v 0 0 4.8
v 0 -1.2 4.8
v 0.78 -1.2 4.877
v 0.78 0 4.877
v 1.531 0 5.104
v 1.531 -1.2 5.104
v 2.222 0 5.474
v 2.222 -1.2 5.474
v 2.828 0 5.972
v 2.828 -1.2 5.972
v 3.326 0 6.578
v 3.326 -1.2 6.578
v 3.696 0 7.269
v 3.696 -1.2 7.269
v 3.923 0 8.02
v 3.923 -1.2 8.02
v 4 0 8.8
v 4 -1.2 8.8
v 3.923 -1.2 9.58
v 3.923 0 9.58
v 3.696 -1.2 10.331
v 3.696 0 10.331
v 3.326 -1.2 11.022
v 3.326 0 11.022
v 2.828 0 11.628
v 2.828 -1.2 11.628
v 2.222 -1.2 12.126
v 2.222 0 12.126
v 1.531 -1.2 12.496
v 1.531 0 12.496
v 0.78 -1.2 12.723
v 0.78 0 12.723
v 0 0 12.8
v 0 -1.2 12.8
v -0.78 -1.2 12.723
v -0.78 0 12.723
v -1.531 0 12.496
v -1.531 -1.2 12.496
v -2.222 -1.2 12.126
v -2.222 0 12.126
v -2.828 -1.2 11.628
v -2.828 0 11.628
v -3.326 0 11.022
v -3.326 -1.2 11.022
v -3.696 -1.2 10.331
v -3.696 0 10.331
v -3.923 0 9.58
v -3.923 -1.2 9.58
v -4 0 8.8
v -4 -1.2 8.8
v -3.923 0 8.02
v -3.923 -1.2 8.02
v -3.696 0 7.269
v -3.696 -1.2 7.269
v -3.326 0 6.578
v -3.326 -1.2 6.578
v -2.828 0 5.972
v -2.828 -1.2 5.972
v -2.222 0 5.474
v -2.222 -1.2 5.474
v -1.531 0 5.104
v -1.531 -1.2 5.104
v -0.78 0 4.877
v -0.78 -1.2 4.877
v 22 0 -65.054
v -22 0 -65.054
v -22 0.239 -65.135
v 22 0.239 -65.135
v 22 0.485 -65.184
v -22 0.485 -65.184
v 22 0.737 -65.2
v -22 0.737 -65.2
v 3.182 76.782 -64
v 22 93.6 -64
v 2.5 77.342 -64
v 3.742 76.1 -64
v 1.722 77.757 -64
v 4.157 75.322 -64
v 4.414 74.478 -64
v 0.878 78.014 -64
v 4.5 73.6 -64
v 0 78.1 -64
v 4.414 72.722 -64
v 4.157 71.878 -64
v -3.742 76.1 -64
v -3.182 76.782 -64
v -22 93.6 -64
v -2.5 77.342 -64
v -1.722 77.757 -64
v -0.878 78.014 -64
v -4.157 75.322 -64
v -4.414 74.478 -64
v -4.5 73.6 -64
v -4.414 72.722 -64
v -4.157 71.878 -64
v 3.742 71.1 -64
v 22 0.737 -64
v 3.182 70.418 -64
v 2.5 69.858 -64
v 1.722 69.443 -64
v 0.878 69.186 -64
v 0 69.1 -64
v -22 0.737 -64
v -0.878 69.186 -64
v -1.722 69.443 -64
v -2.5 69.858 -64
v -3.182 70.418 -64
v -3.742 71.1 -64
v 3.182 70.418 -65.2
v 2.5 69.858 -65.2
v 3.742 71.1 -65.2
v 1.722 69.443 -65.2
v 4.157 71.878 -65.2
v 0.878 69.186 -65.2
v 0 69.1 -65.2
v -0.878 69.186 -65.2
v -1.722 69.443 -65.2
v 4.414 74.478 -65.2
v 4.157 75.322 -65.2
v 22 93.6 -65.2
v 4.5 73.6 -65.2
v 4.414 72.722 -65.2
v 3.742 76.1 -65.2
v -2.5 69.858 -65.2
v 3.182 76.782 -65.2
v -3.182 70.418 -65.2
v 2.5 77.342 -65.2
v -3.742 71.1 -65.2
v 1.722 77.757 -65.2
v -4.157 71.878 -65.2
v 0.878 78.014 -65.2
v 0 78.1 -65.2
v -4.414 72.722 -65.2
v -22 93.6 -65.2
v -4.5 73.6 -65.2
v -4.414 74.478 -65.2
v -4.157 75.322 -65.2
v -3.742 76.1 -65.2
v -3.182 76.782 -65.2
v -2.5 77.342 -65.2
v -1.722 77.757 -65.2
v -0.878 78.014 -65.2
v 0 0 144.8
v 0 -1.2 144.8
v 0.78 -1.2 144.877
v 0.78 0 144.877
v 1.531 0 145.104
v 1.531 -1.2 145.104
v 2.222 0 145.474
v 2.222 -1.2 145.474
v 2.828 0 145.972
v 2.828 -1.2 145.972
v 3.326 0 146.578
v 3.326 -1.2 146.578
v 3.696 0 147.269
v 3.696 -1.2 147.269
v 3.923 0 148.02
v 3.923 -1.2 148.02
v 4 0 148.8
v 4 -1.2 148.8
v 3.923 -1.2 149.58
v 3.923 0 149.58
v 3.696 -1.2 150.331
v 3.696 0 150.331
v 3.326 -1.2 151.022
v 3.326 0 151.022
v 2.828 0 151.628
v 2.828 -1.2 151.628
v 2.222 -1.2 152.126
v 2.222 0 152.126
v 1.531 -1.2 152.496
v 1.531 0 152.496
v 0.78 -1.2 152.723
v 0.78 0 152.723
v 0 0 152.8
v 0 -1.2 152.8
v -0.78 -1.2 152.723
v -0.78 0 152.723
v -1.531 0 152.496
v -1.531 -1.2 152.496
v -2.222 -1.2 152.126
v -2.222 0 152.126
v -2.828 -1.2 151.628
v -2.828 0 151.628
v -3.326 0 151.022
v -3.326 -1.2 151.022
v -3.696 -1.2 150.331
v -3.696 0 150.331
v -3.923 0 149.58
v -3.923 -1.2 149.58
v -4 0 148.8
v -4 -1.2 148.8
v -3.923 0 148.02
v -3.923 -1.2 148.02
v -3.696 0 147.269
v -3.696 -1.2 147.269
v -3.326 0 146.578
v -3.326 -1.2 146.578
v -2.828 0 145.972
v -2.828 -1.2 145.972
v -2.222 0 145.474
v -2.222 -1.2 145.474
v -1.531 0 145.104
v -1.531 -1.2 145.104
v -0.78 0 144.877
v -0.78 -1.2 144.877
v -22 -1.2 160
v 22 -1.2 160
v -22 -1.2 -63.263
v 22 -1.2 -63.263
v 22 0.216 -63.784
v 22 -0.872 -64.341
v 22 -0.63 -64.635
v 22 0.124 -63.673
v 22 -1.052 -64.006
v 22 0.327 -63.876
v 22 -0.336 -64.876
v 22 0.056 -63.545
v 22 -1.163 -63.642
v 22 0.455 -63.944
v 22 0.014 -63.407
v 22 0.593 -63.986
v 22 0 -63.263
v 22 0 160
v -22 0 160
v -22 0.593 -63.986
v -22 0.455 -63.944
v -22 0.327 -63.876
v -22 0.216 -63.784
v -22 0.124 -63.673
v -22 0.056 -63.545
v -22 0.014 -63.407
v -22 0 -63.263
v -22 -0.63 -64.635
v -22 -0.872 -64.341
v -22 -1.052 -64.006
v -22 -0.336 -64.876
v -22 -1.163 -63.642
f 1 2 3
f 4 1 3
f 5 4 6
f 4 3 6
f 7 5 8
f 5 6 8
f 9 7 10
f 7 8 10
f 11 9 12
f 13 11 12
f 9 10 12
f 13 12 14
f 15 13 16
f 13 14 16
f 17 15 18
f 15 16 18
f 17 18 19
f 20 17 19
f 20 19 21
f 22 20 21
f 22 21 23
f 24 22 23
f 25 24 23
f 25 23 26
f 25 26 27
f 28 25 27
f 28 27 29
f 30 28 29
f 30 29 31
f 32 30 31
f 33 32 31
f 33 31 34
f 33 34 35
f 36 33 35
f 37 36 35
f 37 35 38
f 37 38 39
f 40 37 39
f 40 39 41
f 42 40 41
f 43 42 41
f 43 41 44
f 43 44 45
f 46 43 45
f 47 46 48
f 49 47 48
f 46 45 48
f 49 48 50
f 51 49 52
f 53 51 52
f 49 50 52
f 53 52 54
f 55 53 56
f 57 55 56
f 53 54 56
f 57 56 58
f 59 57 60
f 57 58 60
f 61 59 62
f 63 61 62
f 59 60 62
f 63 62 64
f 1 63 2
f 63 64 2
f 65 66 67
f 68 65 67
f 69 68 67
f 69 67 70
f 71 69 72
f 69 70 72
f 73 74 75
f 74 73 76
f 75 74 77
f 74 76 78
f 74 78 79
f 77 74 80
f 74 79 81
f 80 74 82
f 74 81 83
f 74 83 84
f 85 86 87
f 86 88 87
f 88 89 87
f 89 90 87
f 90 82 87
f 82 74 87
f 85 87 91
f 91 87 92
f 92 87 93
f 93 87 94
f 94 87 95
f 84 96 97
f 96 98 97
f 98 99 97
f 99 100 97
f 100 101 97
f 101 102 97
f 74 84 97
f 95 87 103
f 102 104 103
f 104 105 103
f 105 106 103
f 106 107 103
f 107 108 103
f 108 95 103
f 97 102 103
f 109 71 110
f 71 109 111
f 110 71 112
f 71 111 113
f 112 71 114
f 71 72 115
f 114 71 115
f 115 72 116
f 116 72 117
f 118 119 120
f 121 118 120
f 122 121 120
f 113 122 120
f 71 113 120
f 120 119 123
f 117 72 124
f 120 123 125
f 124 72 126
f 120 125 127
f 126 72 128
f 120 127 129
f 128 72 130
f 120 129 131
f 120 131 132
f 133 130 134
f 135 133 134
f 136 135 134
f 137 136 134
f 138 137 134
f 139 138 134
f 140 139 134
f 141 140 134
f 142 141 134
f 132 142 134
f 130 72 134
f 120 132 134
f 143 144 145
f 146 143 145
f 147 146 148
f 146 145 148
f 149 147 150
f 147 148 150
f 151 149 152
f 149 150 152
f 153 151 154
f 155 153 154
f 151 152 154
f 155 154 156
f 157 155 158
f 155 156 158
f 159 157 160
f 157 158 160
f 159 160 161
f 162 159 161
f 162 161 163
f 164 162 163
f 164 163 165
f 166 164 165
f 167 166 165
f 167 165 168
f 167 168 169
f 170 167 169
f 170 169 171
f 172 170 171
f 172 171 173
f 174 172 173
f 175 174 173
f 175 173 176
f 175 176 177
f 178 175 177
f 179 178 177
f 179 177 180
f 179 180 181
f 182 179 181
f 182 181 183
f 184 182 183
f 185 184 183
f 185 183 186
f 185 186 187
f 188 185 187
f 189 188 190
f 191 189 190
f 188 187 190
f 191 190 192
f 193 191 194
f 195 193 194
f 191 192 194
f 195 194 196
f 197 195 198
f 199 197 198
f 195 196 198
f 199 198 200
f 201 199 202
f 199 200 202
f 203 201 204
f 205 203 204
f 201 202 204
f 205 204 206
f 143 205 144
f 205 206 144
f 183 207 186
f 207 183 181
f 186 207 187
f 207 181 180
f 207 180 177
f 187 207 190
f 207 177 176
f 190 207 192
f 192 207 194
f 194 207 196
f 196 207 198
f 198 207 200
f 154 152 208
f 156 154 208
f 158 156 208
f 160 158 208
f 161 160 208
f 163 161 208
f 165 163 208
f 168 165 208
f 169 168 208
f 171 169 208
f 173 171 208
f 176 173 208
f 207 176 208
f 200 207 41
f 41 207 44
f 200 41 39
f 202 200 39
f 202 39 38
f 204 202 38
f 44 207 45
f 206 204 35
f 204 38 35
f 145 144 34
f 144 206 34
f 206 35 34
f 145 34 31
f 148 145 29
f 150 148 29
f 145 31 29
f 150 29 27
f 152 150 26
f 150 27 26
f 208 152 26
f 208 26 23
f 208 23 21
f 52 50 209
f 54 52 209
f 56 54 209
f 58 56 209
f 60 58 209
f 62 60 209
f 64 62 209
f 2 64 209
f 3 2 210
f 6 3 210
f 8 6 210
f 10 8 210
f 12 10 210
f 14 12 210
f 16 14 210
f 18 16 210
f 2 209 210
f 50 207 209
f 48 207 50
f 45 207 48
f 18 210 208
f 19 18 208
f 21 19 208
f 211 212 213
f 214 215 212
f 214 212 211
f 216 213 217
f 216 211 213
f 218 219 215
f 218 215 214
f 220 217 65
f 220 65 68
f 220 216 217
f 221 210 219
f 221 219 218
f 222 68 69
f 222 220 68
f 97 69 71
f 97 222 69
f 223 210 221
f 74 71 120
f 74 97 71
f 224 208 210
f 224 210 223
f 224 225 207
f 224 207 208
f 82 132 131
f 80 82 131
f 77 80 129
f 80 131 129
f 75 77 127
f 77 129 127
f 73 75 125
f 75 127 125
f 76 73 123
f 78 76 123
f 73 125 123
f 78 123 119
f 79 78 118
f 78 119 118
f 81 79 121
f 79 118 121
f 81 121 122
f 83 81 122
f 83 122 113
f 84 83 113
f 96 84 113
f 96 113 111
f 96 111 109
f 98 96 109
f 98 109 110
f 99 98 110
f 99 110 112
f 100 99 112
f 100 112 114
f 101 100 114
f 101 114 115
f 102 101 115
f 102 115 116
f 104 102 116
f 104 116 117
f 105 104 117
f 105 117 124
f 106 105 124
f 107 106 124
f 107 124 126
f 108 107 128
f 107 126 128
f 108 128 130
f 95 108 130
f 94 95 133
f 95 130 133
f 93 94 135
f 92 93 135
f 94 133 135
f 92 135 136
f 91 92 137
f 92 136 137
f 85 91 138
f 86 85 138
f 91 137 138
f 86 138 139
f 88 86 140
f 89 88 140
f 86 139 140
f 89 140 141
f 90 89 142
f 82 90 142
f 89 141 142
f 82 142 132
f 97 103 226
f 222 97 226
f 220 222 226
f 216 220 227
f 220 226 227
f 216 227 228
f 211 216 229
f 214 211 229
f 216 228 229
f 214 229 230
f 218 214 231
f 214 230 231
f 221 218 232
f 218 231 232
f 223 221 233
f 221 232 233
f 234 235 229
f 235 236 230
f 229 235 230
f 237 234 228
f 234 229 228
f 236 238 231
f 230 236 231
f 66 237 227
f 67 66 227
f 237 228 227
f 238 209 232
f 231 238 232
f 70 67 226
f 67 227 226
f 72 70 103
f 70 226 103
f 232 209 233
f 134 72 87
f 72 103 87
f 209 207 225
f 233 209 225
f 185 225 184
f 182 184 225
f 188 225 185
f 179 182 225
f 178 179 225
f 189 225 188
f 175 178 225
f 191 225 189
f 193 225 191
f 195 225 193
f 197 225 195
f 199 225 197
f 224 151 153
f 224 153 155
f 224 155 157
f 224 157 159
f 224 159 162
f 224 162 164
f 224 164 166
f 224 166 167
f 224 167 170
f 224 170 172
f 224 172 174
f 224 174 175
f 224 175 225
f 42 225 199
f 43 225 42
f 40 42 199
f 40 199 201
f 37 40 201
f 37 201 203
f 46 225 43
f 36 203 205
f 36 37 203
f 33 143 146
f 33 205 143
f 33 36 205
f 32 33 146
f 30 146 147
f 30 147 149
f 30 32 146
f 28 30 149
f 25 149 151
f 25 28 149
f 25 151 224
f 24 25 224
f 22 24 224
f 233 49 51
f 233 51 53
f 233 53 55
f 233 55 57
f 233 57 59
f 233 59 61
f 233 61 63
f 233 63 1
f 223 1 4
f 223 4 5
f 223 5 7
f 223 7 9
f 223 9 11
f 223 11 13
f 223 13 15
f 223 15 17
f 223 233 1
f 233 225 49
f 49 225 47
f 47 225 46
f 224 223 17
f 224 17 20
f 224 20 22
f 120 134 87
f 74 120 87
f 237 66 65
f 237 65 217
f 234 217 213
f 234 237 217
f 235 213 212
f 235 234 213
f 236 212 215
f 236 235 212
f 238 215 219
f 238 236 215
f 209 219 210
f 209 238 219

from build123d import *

# Parameters (mm, degrees)
SKETCH1_W              = 44
SKETCH1_H              = 320
BASE_FLANGE1_DEPTH     = 1.2
SKETCHED_START         = -22
SKETCHED_BEND1_DEPTH   = 44
SKETCHED_BEND1_2_DEPTH = 44
SKETCH7_R              = 4.5
CUT_EXTRUDE1_DEPTH     = 10
SKETCH8_R              = 4
CUT_EXTRUDE2_DEPTH     = 10


# Read off the part's stored shape, not the designer's step: Sketched Bend1
# Sheet-metal steps are written as plain solids
with BuildPart() as part:
    # Sketch1 → Base-Flange1 (new body)
    with BuildSketch(Plane(origin=(0, 0, 0), x_dir=(1, 0, 0), z_dir=(0, 1, 0))):
        Rectangle(SKETCH1_W, SKETCH1_H)
    extrude(amount=-BASE_FLANGE1_DEPTH)

    # Sketched Bend1 outline → Sketched Bend1 (cut)
    with BuildSketch(Plane.YZ.offset(SKETCHED_START)):
        with BuildLine():
            Line((0, -160), (0, -65.054444388))
            ThreePointArc((0, -65.054444388), (-0.872269031, -64.341342484), (-1.2, -63.2634))
            Line((-1.2, -63.2634), (-1.2, -160))
            Line((-1.2, -160), (0, -160))
        make_face()
    extrude(amount=SKETCHED_BEND1_DEPTH, mode=Mode.SUBTRACT)

    # Sketched Bend1 2 outline → Sketched Bend1 2 (add)
    with BuildSketch(Plane.YZ.offset(SKETCHED_START)):
        with BuildLine():
            Line((93.6, -64), (0.7366, -64))
            ThreePointArc((0.7366, -64), (0.215745145, -63.784254855), (0, -63.2634))
            Line((0, -63.2634), (0, -65.054444388))
            ThreePointArc((0, -65.054444388), (0.361178238, -65.163262642), (0.7366, -65.2))
            Line((0.7366, -65.2), (93.6, -65.2))
            Line((93.6, -65.2), (93.6, -64))
        make_face()
    extrude(amount=SKETCHED_BEND1_2_DEPTH)

    # Sketch7 → Cut-Extrude1 (cut)
    with BuildSketch(Plane(origin=(0, 0, -65.2), x_dir=(-1, 0, 0), z_dir=(0, 0, -1))):
        with Locations(Location((0, 73.6, 0), (0, 0, 90))):
            Circle(SKETCH7_R)
    extrude(amount=-CUT_EXTRUDE1_DEPTH, mode=Mode.SUBTRACT)

    # Sketch8 → Cut-Extrude2 (cut)
    with BuildSketch(Plane.XZ.offset(1.2)):
        with Locations(Location((0, 8.8, 0), (0, 0, 270))):
            Circle(SKETCH8_R)
        with Locations(Location((0, 148.8, 0), (0, 0, 270))):
            Circle(SKETCH8_R)
    extrude(amount=-CUT_EXTRUDE2_DEPTH, mode=Mode.SUBTRACT)


solid = part.part
